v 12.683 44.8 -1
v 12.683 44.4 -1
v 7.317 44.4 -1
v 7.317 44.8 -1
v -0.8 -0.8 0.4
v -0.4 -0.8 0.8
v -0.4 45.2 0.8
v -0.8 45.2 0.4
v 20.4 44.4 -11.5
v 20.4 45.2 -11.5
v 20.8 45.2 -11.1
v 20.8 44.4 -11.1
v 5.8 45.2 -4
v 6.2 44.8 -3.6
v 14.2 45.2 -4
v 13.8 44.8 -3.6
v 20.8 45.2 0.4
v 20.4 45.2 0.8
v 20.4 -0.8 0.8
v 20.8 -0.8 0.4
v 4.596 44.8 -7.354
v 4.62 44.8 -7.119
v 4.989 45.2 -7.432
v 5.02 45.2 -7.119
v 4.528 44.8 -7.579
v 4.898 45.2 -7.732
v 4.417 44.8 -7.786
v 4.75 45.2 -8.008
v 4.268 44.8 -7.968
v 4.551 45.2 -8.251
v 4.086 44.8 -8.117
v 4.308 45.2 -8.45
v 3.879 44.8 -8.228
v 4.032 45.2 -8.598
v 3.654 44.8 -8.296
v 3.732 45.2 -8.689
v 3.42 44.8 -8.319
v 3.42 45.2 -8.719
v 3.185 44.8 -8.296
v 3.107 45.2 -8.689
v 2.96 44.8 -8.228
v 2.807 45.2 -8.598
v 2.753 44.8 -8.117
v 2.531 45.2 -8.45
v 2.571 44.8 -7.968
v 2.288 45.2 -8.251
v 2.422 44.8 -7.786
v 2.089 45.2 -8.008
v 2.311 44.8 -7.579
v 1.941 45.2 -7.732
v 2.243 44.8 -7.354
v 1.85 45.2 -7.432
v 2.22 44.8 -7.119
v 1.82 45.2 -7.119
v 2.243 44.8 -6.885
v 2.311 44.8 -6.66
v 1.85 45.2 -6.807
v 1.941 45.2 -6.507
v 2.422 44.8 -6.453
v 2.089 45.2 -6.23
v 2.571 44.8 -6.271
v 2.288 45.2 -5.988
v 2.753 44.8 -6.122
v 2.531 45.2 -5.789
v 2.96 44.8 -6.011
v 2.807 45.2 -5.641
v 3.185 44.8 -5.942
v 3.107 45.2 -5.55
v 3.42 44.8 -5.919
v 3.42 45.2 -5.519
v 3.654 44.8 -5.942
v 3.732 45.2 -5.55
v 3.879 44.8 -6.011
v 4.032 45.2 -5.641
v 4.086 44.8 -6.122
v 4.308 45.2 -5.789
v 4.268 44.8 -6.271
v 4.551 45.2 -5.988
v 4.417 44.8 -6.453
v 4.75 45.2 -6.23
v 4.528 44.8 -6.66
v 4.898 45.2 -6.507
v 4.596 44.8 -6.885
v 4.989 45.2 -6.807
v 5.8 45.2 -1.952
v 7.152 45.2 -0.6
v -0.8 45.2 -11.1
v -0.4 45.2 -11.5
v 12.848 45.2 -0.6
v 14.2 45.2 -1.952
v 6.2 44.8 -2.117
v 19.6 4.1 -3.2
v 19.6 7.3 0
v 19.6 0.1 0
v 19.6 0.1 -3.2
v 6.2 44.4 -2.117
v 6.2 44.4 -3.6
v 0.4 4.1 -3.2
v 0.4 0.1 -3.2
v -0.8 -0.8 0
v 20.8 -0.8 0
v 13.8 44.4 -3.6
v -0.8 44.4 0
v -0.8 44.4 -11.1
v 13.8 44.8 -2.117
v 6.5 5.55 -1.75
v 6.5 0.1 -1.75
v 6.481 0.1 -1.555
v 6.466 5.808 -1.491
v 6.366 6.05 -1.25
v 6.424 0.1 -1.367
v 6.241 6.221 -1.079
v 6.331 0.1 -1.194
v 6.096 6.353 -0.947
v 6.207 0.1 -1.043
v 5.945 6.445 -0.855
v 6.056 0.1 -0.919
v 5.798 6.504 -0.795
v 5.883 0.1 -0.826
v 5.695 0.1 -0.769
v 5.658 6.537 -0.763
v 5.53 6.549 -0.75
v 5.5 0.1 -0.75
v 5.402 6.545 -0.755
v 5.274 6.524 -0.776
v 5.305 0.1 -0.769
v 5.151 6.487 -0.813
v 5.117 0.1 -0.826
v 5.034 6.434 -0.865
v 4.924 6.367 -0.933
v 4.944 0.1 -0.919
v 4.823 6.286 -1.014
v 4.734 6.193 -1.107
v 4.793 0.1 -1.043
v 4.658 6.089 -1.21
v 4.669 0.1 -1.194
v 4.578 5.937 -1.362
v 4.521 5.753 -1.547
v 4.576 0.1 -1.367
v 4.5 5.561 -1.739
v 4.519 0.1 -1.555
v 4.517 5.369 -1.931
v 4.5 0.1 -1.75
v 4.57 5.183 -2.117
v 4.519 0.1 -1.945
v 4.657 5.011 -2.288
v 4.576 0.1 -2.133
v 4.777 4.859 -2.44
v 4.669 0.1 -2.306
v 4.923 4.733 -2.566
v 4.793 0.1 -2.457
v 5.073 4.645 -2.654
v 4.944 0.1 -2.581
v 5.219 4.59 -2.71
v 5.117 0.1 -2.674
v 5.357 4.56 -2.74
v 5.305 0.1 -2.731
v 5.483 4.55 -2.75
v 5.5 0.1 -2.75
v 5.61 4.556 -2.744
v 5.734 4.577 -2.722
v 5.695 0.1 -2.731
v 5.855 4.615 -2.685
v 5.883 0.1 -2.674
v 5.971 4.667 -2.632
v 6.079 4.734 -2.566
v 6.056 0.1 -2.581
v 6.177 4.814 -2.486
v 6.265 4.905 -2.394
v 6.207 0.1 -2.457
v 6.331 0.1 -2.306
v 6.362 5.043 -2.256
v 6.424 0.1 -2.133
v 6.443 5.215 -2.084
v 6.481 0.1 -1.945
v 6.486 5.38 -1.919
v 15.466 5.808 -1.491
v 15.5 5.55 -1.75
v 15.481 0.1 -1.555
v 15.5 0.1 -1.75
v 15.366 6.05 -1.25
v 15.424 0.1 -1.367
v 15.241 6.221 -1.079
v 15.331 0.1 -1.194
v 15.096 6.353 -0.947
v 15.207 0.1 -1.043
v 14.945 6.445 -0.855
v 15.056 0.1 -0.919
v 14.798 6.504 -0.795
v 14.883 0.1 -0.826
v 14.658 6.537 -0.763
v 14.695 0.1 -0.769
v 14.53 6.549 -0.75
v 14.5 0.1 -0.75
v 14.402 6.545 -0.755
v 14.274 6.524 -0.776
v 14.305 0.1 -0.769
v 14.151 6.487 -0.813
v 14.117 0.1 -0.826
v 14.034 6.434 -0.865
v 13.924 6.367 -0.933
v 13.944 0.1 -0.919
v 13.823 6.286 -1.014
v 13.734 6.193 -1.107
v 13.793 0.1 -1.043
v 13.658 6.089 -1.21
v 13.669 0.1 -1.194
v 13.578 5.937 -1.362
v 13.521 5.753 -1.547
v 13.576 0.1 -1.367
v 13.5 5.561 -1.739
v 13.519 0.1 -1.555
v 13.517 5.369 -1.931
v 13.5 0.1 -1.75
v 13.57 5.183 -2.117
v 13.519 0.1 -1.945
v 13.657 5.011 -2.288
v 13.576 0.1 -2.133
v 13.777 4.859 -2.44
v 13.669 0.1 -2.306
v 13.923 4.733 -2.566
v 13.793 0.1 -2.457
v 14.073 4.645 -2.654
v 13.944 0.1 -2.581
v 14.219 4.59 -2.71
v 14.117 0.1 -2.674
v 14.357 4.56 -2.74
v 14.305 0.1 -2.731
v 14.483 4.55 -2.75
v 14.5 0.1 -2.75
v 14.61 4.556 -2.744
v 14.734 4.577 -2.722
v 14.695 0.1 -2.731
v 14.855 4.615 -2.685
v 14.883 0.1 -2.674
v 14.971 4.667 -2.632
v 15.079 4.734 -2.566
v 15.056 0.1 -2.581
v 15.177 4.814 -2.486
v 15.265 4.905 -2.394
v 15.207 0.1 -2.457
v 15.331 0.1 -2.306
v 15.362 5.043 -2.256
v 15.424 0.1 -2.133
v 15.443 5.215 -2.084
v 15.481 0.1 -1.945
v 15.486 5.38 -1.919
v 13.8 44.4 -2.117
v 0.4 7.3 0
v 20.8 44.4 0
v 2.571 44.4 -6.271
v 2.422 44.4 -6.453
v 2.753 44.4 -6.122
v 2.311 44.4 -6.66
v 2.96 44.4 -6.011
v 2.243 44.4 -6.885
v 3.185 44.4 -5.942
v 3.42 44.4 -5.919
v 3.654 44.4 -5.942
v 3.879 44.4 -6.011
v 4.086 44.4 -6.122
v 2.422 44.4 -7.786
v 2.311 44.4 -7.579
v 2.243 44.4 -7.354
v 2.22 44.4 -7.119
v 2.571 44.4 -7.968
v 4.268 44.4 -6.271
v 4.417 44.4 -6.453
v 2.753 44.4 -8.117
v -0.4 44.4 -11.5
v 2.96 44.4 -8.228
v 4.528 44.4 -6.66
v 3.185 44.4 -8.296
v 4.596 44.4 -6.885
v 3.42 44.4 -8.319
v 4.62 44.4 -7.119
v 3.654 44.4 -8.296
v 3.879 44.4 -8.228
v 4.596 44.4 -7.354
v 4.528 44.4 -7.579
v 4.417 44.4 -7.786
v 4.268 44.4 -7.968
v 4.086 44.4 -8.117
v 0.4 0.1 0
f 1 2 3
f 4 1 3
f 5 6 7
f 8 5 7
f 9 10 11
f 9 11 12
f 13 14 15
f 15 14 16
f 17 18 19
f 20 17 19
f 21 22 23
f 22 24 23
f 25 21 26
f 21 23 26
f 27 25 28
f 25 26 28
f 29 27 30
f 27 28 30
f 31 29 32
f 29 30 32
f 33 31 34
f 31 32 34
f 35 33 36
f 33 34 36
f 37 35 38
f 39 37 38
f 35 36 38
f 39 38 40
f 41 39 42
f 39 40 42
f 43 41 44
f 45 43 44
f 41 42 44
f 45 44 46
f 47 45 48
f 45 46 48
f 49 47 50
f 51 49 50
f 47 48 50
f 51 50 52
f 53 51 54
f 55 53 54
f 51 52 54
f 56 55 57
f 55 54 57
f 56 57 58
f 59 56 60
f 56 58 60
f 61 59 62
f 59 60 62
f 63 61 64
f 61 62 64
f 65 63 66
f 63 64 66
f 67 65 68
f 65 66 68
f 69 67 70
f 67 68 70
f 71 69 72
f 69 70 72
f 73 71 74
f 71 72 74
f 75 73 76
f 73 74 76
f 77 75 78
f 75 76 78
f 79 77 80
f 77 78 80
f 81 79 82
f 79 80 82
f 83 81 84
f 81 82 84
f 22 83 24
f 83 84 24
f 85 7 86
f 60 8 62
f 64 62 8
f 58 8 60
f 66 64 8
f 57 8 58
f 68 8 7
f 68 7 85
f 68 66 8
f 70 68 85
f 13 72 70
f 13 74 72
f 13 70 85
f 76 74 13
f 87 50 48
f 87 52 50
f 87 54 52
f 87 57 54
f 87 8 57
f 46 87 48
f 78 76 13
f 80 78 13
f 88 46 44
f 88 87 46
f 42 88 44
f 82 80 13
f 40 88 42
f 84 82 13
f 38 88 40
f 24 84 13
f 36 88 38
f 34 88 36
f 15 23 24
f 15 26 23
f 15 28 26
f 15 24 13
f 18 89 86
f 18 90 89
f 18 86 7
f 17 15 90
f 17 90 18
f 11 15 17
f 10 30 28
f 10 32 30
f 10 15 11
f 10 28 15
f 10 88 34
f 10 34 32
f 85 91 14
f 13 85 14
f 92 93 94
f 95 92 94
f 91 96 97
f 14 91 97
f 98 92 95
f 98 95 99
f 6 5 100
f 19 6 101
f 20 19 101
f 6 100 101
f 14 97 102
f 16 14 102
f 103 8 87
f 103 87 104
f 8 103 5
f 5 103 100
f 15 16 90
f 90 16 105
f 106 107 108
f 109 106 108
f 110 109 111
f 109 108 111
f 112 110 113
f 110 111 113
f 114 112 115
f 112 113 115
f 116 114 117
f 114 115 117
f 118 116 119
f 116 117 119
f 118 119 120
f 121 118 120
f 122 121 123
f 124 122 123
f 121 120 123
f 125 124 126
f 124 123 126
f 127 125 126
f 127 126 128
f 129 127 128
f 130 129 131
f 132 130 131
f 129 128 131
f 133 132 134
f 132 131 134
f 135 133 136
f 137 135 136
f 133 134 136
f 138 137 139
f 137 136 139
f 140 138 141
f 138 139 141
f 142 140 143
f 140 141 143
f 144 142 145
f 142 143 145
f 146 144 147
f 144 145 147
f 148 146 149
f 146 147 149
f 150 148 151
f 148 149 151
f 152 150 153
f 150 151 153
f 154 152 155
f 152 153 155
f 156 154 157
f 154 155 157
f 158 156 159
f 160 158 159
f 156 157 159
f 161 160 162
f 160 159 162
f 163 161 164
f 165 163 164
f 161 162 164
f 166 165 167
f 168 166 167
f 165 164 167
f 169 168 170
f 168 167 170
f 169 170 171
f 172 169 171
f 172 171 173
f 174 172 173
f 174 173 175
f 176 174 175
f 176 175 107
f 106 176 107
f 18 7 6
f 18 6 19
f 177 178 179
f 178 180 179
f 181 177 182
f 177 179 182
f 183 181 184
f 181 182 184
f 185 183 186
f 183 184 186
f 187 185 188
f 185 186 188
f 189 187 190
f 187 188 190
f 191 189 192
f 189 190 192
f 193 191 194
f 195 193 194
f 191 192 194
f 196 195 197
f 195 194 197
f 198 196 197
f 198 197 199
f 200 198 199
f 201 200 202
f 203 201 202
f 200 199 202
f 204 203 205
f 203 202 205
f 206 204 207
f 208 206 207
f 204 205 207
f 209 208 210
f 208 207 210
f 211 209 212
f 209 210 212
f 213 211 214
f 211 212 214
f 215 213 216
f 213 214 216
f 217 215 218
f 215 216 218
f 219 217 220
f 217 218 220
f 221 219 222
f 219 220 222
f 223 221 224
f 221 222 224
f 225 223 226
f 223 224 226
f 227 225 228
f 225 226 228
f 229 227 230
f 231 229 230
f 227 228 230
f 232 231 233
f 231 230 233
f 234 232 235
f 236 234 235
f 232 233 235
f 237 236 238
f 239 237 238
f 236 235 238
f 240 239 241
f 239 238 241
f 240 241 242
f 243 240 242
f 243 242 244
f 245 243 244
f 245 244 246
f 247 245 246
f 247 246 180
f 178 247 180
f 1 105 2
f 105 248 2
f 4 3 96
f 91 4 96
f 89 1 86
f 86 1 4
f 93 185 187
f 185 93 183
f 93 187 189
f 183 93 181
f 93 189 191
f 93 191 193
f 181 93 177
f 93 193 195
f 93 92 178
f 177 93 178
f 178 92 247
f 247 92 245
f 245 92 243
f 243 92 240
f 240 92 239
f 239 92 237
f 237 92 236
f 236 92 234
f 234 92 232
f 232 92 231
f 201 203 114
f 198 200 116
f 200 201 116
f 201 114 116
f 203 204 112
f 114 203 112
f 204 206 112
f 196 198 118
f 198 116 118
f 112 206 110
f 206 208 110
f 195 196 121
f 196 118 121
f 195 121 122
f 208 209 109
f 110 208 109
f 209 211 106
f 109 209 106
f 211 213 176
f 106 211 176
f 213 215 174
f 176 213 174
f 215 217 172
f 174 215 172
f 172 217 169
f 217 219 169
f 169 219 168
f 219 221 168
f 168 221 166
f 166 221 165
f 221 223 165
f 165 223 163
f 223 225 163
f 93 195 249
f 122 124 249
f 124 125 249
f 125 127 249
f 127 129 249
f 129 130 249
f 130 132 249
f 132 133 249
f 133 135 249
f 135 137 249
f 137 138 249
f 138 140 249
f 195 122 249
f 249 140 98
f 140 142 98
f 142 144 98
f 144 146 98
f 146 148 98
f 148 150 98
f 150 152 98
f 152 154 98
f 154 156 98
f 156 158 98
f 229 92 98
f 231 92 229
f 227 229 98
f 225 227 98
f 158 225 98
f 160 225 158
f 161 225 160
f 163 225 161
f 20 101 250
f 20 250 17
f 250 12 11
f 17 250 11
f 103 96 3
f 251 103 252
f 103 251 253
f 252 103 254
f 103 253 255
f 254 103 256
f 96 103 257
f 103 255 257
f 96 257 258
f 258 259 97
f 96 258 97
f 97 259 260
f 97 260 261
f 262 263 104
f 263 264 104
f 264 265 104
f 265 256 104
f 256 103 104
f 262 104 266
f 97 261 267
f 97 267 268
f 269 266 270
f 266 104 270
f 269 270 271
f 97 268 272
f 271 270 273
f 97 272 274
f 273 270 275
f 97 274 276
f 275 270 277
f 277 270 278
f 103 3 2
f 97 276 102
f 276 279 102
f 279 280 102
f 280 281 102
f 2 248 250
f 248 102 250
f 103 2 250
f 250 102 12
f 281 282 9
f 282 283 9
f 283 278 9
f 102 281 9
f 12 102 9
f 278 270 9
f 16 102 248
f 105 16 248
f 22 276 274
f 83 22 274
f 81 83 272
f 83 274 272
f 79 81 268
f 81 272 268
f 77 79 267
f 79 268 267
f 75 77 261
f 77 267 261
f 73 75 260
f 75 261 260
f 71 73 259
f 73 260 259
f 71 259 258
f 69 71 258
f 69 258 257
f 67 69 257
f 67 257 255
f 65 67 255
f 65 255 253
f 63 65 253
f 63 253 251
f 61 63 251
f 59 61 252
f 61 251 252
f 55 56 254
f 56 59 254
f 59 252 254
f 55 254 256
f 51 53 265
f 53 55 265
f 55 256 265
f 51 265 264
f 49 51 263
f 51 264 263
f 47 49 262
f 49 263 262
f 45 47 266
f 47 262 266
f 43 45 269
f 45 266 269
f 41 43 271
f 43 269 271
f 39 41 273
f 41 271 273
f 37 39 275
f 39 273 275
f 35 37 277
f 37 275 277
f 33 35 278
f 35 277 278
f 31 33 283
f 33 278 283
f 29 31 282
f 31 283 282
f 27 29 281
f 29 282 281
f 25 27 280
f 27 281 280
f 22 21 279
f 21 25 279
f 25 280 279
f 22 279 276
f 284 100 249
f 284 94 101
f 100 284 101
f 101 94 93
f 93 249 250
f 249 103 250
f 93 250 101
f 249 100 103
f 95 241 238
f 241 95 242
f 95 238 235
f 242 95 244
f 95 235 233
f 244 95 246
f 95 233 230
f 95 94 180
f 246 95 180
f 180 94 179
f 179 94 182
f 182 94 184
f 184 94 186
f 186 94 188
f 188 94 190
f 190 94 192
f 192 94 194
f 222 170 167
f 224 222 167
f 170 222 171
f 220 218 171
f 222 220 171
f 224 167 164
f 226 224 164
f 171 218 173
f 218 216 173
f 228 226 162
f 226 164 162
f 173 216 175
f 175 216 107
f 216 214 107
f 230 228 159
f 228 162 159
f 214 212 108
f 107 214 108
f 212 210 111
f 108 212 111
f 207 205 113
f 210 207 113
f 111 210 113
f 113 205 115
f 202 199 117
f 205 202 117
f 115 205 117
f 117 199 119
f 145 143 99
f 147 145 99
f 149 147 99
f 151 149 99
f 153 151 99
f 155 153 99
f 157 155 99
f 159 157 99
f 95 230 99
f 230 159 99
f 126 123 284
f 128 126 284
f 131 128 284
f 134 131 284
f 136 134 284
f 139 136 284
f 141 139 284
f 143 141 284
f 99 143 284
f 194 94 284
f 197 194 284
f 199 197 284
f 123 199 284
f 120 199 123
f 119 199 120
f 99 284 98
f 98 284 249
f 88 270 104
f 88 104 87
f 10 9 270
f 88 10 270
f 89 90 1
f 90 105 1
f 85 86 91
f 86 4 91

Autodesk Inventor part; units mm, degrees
ref_plane "YZ Plane" through (0, 0, 0) normal (1, 0, 0) x (0, 1, 0)
ref_plane "XZ Plane" through (0, 0, 0) normal (0, 1, 0) x (-1, 0, 0)
ref_plane "XY Plane" through (0, 0, 0) normal (0, 0, 1) x (1, 0, 0)
sketch "Sketch1" plane through (0, 0, 0) normal (0, 0, 1) x (1, 0, 0)
  line L0 (0, 44.4) -> (0, 0) construction
  line L1 (0, 44.4) -> (-0.8, 44.4) construction
  line L2 (-0.8, 44.4) -> (-0.8, -0.8) construction
  line L3 (20.8, -0.8) -> (-0.8, -0.8) construction
  line L4 (20.8, 44.4) -> (20.8, -0.8) construction
  line L5 (20, 44.4) -> (20.8, 44.4) construction
  line L6 (20, 44.4) -> (20, 0) construction
  line L7 (20, 0) -> (0, 0) construction
  line L8 (-0.8, -0.8) -> (20.8, -0.8)
  line L9 (20.8, -0.8) -> (20.8, 44.4)
  line L10 (20.8, 44.4) -> (-0.8, 44.4)
  line L11 (-0.8, 44.4) -> (-0.8, -0.8)
extrude "Extrusion1" add sketch "Sketch1" along normal blind 0.8
sketch "Sketch2" plane through (-0.8, 44.4, 0) normal (0, 1, 0) x (1, 0, 0)
  line L0 (7.1248, 6.15) -> (6.7248, 5.75) construction
  line L1 (7.1248, 10.1) -> (7.1248, 6.15) construction
  line L2 (7.5248, 10.5) -> (7.1248, 10.1) construction
  line L3 (7.5248, 10.5) -> (20.4, 10.5) construction
  line L4 (20.8, 10.1) -> (20.4, 10.5) construction
  line L5 (20.8, 10.1) -> (20.8, 0) construction
  line L6 (20.8, 0) -> (21.6, 0) construction
  line L7 (21.6, 11.1) -> (21.6, 0) construction
  line L8 (21.2, 11.5) -> (21.6, 11.1) construction
  line L9 (21.2, 11.5) -> (0.4, 11.5) construction
  line L10 (0, 11.1) -> (0.4, 11.5) construction
  line L11 (0, 0) -> (0, 11.1) construction
  line L12 (0.8, 0) -> (0, 0) construction
  line L13 (0.8, 0) -> (0.8, 5.35) construction
  line L14 (1.2, 5.75) -> (0.8, 5.35) construction
  line L15 (6.7248, 5.75) -> (1.2, 5.75) construction
  circle A0 centre (4.2195, 7.1194) radius 1 construction
  line L16 (21.6, -0.8) -> (0, -0.8) construction
  line L17 (0, -0.8) -> (21.6, -0.8) projected
  line L18 (0, -0.8) -> (21.6, -0.8)
  line L19 (21.6, -0.8) -> (21.6, 11.5)
  line L20 (21.6, 11.5) -> (0, 11.5)
  line L21 (0, 11.5) -> (0, -0.8)
  circle A1 centre (4.2195, 7.1194) radius 1.2
  line L22 (14.4, 3.4) -> (14.4, 2.2) construction
  line L23 (13.4, 1.2) -> (14.4, 2.2) construction
  line L24 (13.4, 1.2) -> (8.2, 1.2) construction
  line L25 (7.2, 2.2) -> (8.2, 1.2) construction
  line L26 (7.2, 2.2) -> (7.2, 3.4) construction
  line L27 (7.2, 3.4) -> (14.4, 3.4) construction
  line L28 (7.8, 8.5) -> (7.8, 5.5) construction
  line L29 (7.8, 5.5) -> (0.8, 5.5) construction
  line L30 (0.8, 0) -> (0.8, 5.5) construction
  line L31 (0.8, 0) -> (20.8, 0) construction
  line L32 (20.8, 0) -> (20.8, 8.5) construction
  line L33 (20.8, 8.5) -> (7.8, 8.5) construction
  line L34 (14.6, 3.6) -> (14.6, 2.1172)
  line L35 (14.6, 2.1172) -> (13.4828, 1)
  line L36 (13.4828, 1) -> (8.1172, 1)
  line L37 (8.1172, 1) -> (7, 2.1172)
  line L38 (7, 2.1172) -> (7, 3.6)
  line L39 (7, 3.6) -> (14.6, 3.6)
  dimension "d18" = 0.2
  dimension "d34" = 0.2
extrude "Extrusion2" add sketch "Sketch2" along normal blind 0.8
sketch "Sketch3" plane through (0, 0, 0) normal (0, 0, -1) x (-1, 0, 0)
  line L0 (-20, 0) -> (0, 0) construction
  line L1 (-20, 44.4) -> (-20, 0) construction
  line L2 (0, 44.4) -> (0, 0) construction
  line L3 (-20, 11) -> (-20, 0) construction
  line L4 (0, 11) -> (-20, 11) construction
  line L5 (0, 0) -> (0, 11) construction
  line L6 (-20, 0) -> (0, 0) construction
  line L7 (-19.6, 0.1) -> (-0.4, 0.1)
  line L8 (-0.4, 0.1) -> (-0.4, 4.1)
  line L9 (-0.4, 4.1) -> (-19.6, 4.1)
  line L10 (-19.6, 4.1) -> (-19.6, 0.1)
  dimension "d6" = 4
  dimension "d7" = 0.4
  dimension "d8" = 0.4
  dimension "d9" = 0.1
extrude "Extrusion3" add sketch "Sketch3" along normal blind 3.2
chamfer "Chamfer4" distance 3.2 angle 45 1 edges at (10, 4.1, 0)
sketch "Sketch5" plane through (0.4, 0.1, 0) normal (0, -1, 0) x (1, 0, 0)
  circle A0 centre (14.1, -1.75) radius 1.1 projected
  circle A1 centre (5.1, -1.75) radius 1.1 projected
  circle A2 centre (14.1, -1.75) radius 1
  circle A3 centre (5.1, -1.75) radius 1
  point P0 (-0.4, 0)
  dimension "d33" = 2
extrude "Extrusion5" cut sketch "Sketch5" against normal blind 16.45 contours A2 | A3
chamfer "Chamfer5" distance 0.4 angle 45 11 edges at (-0.8, 22.2, 0.8) (20.8, 22.2, 0.8) (-0.8, 44.8, -11.5) (20.8, 44.8, -11.5) (2.2195, 45.2, -7.1194) (10, 45.2, -3.6) (6.2, 45.2, -2.8586) (6.7586, 45.2, -1.5586) (10, 45.2, -1) (13.2414, 45.2, -1.5586) (13.8, 45.2, -2.8586)
properties part number "carcasainferior"
